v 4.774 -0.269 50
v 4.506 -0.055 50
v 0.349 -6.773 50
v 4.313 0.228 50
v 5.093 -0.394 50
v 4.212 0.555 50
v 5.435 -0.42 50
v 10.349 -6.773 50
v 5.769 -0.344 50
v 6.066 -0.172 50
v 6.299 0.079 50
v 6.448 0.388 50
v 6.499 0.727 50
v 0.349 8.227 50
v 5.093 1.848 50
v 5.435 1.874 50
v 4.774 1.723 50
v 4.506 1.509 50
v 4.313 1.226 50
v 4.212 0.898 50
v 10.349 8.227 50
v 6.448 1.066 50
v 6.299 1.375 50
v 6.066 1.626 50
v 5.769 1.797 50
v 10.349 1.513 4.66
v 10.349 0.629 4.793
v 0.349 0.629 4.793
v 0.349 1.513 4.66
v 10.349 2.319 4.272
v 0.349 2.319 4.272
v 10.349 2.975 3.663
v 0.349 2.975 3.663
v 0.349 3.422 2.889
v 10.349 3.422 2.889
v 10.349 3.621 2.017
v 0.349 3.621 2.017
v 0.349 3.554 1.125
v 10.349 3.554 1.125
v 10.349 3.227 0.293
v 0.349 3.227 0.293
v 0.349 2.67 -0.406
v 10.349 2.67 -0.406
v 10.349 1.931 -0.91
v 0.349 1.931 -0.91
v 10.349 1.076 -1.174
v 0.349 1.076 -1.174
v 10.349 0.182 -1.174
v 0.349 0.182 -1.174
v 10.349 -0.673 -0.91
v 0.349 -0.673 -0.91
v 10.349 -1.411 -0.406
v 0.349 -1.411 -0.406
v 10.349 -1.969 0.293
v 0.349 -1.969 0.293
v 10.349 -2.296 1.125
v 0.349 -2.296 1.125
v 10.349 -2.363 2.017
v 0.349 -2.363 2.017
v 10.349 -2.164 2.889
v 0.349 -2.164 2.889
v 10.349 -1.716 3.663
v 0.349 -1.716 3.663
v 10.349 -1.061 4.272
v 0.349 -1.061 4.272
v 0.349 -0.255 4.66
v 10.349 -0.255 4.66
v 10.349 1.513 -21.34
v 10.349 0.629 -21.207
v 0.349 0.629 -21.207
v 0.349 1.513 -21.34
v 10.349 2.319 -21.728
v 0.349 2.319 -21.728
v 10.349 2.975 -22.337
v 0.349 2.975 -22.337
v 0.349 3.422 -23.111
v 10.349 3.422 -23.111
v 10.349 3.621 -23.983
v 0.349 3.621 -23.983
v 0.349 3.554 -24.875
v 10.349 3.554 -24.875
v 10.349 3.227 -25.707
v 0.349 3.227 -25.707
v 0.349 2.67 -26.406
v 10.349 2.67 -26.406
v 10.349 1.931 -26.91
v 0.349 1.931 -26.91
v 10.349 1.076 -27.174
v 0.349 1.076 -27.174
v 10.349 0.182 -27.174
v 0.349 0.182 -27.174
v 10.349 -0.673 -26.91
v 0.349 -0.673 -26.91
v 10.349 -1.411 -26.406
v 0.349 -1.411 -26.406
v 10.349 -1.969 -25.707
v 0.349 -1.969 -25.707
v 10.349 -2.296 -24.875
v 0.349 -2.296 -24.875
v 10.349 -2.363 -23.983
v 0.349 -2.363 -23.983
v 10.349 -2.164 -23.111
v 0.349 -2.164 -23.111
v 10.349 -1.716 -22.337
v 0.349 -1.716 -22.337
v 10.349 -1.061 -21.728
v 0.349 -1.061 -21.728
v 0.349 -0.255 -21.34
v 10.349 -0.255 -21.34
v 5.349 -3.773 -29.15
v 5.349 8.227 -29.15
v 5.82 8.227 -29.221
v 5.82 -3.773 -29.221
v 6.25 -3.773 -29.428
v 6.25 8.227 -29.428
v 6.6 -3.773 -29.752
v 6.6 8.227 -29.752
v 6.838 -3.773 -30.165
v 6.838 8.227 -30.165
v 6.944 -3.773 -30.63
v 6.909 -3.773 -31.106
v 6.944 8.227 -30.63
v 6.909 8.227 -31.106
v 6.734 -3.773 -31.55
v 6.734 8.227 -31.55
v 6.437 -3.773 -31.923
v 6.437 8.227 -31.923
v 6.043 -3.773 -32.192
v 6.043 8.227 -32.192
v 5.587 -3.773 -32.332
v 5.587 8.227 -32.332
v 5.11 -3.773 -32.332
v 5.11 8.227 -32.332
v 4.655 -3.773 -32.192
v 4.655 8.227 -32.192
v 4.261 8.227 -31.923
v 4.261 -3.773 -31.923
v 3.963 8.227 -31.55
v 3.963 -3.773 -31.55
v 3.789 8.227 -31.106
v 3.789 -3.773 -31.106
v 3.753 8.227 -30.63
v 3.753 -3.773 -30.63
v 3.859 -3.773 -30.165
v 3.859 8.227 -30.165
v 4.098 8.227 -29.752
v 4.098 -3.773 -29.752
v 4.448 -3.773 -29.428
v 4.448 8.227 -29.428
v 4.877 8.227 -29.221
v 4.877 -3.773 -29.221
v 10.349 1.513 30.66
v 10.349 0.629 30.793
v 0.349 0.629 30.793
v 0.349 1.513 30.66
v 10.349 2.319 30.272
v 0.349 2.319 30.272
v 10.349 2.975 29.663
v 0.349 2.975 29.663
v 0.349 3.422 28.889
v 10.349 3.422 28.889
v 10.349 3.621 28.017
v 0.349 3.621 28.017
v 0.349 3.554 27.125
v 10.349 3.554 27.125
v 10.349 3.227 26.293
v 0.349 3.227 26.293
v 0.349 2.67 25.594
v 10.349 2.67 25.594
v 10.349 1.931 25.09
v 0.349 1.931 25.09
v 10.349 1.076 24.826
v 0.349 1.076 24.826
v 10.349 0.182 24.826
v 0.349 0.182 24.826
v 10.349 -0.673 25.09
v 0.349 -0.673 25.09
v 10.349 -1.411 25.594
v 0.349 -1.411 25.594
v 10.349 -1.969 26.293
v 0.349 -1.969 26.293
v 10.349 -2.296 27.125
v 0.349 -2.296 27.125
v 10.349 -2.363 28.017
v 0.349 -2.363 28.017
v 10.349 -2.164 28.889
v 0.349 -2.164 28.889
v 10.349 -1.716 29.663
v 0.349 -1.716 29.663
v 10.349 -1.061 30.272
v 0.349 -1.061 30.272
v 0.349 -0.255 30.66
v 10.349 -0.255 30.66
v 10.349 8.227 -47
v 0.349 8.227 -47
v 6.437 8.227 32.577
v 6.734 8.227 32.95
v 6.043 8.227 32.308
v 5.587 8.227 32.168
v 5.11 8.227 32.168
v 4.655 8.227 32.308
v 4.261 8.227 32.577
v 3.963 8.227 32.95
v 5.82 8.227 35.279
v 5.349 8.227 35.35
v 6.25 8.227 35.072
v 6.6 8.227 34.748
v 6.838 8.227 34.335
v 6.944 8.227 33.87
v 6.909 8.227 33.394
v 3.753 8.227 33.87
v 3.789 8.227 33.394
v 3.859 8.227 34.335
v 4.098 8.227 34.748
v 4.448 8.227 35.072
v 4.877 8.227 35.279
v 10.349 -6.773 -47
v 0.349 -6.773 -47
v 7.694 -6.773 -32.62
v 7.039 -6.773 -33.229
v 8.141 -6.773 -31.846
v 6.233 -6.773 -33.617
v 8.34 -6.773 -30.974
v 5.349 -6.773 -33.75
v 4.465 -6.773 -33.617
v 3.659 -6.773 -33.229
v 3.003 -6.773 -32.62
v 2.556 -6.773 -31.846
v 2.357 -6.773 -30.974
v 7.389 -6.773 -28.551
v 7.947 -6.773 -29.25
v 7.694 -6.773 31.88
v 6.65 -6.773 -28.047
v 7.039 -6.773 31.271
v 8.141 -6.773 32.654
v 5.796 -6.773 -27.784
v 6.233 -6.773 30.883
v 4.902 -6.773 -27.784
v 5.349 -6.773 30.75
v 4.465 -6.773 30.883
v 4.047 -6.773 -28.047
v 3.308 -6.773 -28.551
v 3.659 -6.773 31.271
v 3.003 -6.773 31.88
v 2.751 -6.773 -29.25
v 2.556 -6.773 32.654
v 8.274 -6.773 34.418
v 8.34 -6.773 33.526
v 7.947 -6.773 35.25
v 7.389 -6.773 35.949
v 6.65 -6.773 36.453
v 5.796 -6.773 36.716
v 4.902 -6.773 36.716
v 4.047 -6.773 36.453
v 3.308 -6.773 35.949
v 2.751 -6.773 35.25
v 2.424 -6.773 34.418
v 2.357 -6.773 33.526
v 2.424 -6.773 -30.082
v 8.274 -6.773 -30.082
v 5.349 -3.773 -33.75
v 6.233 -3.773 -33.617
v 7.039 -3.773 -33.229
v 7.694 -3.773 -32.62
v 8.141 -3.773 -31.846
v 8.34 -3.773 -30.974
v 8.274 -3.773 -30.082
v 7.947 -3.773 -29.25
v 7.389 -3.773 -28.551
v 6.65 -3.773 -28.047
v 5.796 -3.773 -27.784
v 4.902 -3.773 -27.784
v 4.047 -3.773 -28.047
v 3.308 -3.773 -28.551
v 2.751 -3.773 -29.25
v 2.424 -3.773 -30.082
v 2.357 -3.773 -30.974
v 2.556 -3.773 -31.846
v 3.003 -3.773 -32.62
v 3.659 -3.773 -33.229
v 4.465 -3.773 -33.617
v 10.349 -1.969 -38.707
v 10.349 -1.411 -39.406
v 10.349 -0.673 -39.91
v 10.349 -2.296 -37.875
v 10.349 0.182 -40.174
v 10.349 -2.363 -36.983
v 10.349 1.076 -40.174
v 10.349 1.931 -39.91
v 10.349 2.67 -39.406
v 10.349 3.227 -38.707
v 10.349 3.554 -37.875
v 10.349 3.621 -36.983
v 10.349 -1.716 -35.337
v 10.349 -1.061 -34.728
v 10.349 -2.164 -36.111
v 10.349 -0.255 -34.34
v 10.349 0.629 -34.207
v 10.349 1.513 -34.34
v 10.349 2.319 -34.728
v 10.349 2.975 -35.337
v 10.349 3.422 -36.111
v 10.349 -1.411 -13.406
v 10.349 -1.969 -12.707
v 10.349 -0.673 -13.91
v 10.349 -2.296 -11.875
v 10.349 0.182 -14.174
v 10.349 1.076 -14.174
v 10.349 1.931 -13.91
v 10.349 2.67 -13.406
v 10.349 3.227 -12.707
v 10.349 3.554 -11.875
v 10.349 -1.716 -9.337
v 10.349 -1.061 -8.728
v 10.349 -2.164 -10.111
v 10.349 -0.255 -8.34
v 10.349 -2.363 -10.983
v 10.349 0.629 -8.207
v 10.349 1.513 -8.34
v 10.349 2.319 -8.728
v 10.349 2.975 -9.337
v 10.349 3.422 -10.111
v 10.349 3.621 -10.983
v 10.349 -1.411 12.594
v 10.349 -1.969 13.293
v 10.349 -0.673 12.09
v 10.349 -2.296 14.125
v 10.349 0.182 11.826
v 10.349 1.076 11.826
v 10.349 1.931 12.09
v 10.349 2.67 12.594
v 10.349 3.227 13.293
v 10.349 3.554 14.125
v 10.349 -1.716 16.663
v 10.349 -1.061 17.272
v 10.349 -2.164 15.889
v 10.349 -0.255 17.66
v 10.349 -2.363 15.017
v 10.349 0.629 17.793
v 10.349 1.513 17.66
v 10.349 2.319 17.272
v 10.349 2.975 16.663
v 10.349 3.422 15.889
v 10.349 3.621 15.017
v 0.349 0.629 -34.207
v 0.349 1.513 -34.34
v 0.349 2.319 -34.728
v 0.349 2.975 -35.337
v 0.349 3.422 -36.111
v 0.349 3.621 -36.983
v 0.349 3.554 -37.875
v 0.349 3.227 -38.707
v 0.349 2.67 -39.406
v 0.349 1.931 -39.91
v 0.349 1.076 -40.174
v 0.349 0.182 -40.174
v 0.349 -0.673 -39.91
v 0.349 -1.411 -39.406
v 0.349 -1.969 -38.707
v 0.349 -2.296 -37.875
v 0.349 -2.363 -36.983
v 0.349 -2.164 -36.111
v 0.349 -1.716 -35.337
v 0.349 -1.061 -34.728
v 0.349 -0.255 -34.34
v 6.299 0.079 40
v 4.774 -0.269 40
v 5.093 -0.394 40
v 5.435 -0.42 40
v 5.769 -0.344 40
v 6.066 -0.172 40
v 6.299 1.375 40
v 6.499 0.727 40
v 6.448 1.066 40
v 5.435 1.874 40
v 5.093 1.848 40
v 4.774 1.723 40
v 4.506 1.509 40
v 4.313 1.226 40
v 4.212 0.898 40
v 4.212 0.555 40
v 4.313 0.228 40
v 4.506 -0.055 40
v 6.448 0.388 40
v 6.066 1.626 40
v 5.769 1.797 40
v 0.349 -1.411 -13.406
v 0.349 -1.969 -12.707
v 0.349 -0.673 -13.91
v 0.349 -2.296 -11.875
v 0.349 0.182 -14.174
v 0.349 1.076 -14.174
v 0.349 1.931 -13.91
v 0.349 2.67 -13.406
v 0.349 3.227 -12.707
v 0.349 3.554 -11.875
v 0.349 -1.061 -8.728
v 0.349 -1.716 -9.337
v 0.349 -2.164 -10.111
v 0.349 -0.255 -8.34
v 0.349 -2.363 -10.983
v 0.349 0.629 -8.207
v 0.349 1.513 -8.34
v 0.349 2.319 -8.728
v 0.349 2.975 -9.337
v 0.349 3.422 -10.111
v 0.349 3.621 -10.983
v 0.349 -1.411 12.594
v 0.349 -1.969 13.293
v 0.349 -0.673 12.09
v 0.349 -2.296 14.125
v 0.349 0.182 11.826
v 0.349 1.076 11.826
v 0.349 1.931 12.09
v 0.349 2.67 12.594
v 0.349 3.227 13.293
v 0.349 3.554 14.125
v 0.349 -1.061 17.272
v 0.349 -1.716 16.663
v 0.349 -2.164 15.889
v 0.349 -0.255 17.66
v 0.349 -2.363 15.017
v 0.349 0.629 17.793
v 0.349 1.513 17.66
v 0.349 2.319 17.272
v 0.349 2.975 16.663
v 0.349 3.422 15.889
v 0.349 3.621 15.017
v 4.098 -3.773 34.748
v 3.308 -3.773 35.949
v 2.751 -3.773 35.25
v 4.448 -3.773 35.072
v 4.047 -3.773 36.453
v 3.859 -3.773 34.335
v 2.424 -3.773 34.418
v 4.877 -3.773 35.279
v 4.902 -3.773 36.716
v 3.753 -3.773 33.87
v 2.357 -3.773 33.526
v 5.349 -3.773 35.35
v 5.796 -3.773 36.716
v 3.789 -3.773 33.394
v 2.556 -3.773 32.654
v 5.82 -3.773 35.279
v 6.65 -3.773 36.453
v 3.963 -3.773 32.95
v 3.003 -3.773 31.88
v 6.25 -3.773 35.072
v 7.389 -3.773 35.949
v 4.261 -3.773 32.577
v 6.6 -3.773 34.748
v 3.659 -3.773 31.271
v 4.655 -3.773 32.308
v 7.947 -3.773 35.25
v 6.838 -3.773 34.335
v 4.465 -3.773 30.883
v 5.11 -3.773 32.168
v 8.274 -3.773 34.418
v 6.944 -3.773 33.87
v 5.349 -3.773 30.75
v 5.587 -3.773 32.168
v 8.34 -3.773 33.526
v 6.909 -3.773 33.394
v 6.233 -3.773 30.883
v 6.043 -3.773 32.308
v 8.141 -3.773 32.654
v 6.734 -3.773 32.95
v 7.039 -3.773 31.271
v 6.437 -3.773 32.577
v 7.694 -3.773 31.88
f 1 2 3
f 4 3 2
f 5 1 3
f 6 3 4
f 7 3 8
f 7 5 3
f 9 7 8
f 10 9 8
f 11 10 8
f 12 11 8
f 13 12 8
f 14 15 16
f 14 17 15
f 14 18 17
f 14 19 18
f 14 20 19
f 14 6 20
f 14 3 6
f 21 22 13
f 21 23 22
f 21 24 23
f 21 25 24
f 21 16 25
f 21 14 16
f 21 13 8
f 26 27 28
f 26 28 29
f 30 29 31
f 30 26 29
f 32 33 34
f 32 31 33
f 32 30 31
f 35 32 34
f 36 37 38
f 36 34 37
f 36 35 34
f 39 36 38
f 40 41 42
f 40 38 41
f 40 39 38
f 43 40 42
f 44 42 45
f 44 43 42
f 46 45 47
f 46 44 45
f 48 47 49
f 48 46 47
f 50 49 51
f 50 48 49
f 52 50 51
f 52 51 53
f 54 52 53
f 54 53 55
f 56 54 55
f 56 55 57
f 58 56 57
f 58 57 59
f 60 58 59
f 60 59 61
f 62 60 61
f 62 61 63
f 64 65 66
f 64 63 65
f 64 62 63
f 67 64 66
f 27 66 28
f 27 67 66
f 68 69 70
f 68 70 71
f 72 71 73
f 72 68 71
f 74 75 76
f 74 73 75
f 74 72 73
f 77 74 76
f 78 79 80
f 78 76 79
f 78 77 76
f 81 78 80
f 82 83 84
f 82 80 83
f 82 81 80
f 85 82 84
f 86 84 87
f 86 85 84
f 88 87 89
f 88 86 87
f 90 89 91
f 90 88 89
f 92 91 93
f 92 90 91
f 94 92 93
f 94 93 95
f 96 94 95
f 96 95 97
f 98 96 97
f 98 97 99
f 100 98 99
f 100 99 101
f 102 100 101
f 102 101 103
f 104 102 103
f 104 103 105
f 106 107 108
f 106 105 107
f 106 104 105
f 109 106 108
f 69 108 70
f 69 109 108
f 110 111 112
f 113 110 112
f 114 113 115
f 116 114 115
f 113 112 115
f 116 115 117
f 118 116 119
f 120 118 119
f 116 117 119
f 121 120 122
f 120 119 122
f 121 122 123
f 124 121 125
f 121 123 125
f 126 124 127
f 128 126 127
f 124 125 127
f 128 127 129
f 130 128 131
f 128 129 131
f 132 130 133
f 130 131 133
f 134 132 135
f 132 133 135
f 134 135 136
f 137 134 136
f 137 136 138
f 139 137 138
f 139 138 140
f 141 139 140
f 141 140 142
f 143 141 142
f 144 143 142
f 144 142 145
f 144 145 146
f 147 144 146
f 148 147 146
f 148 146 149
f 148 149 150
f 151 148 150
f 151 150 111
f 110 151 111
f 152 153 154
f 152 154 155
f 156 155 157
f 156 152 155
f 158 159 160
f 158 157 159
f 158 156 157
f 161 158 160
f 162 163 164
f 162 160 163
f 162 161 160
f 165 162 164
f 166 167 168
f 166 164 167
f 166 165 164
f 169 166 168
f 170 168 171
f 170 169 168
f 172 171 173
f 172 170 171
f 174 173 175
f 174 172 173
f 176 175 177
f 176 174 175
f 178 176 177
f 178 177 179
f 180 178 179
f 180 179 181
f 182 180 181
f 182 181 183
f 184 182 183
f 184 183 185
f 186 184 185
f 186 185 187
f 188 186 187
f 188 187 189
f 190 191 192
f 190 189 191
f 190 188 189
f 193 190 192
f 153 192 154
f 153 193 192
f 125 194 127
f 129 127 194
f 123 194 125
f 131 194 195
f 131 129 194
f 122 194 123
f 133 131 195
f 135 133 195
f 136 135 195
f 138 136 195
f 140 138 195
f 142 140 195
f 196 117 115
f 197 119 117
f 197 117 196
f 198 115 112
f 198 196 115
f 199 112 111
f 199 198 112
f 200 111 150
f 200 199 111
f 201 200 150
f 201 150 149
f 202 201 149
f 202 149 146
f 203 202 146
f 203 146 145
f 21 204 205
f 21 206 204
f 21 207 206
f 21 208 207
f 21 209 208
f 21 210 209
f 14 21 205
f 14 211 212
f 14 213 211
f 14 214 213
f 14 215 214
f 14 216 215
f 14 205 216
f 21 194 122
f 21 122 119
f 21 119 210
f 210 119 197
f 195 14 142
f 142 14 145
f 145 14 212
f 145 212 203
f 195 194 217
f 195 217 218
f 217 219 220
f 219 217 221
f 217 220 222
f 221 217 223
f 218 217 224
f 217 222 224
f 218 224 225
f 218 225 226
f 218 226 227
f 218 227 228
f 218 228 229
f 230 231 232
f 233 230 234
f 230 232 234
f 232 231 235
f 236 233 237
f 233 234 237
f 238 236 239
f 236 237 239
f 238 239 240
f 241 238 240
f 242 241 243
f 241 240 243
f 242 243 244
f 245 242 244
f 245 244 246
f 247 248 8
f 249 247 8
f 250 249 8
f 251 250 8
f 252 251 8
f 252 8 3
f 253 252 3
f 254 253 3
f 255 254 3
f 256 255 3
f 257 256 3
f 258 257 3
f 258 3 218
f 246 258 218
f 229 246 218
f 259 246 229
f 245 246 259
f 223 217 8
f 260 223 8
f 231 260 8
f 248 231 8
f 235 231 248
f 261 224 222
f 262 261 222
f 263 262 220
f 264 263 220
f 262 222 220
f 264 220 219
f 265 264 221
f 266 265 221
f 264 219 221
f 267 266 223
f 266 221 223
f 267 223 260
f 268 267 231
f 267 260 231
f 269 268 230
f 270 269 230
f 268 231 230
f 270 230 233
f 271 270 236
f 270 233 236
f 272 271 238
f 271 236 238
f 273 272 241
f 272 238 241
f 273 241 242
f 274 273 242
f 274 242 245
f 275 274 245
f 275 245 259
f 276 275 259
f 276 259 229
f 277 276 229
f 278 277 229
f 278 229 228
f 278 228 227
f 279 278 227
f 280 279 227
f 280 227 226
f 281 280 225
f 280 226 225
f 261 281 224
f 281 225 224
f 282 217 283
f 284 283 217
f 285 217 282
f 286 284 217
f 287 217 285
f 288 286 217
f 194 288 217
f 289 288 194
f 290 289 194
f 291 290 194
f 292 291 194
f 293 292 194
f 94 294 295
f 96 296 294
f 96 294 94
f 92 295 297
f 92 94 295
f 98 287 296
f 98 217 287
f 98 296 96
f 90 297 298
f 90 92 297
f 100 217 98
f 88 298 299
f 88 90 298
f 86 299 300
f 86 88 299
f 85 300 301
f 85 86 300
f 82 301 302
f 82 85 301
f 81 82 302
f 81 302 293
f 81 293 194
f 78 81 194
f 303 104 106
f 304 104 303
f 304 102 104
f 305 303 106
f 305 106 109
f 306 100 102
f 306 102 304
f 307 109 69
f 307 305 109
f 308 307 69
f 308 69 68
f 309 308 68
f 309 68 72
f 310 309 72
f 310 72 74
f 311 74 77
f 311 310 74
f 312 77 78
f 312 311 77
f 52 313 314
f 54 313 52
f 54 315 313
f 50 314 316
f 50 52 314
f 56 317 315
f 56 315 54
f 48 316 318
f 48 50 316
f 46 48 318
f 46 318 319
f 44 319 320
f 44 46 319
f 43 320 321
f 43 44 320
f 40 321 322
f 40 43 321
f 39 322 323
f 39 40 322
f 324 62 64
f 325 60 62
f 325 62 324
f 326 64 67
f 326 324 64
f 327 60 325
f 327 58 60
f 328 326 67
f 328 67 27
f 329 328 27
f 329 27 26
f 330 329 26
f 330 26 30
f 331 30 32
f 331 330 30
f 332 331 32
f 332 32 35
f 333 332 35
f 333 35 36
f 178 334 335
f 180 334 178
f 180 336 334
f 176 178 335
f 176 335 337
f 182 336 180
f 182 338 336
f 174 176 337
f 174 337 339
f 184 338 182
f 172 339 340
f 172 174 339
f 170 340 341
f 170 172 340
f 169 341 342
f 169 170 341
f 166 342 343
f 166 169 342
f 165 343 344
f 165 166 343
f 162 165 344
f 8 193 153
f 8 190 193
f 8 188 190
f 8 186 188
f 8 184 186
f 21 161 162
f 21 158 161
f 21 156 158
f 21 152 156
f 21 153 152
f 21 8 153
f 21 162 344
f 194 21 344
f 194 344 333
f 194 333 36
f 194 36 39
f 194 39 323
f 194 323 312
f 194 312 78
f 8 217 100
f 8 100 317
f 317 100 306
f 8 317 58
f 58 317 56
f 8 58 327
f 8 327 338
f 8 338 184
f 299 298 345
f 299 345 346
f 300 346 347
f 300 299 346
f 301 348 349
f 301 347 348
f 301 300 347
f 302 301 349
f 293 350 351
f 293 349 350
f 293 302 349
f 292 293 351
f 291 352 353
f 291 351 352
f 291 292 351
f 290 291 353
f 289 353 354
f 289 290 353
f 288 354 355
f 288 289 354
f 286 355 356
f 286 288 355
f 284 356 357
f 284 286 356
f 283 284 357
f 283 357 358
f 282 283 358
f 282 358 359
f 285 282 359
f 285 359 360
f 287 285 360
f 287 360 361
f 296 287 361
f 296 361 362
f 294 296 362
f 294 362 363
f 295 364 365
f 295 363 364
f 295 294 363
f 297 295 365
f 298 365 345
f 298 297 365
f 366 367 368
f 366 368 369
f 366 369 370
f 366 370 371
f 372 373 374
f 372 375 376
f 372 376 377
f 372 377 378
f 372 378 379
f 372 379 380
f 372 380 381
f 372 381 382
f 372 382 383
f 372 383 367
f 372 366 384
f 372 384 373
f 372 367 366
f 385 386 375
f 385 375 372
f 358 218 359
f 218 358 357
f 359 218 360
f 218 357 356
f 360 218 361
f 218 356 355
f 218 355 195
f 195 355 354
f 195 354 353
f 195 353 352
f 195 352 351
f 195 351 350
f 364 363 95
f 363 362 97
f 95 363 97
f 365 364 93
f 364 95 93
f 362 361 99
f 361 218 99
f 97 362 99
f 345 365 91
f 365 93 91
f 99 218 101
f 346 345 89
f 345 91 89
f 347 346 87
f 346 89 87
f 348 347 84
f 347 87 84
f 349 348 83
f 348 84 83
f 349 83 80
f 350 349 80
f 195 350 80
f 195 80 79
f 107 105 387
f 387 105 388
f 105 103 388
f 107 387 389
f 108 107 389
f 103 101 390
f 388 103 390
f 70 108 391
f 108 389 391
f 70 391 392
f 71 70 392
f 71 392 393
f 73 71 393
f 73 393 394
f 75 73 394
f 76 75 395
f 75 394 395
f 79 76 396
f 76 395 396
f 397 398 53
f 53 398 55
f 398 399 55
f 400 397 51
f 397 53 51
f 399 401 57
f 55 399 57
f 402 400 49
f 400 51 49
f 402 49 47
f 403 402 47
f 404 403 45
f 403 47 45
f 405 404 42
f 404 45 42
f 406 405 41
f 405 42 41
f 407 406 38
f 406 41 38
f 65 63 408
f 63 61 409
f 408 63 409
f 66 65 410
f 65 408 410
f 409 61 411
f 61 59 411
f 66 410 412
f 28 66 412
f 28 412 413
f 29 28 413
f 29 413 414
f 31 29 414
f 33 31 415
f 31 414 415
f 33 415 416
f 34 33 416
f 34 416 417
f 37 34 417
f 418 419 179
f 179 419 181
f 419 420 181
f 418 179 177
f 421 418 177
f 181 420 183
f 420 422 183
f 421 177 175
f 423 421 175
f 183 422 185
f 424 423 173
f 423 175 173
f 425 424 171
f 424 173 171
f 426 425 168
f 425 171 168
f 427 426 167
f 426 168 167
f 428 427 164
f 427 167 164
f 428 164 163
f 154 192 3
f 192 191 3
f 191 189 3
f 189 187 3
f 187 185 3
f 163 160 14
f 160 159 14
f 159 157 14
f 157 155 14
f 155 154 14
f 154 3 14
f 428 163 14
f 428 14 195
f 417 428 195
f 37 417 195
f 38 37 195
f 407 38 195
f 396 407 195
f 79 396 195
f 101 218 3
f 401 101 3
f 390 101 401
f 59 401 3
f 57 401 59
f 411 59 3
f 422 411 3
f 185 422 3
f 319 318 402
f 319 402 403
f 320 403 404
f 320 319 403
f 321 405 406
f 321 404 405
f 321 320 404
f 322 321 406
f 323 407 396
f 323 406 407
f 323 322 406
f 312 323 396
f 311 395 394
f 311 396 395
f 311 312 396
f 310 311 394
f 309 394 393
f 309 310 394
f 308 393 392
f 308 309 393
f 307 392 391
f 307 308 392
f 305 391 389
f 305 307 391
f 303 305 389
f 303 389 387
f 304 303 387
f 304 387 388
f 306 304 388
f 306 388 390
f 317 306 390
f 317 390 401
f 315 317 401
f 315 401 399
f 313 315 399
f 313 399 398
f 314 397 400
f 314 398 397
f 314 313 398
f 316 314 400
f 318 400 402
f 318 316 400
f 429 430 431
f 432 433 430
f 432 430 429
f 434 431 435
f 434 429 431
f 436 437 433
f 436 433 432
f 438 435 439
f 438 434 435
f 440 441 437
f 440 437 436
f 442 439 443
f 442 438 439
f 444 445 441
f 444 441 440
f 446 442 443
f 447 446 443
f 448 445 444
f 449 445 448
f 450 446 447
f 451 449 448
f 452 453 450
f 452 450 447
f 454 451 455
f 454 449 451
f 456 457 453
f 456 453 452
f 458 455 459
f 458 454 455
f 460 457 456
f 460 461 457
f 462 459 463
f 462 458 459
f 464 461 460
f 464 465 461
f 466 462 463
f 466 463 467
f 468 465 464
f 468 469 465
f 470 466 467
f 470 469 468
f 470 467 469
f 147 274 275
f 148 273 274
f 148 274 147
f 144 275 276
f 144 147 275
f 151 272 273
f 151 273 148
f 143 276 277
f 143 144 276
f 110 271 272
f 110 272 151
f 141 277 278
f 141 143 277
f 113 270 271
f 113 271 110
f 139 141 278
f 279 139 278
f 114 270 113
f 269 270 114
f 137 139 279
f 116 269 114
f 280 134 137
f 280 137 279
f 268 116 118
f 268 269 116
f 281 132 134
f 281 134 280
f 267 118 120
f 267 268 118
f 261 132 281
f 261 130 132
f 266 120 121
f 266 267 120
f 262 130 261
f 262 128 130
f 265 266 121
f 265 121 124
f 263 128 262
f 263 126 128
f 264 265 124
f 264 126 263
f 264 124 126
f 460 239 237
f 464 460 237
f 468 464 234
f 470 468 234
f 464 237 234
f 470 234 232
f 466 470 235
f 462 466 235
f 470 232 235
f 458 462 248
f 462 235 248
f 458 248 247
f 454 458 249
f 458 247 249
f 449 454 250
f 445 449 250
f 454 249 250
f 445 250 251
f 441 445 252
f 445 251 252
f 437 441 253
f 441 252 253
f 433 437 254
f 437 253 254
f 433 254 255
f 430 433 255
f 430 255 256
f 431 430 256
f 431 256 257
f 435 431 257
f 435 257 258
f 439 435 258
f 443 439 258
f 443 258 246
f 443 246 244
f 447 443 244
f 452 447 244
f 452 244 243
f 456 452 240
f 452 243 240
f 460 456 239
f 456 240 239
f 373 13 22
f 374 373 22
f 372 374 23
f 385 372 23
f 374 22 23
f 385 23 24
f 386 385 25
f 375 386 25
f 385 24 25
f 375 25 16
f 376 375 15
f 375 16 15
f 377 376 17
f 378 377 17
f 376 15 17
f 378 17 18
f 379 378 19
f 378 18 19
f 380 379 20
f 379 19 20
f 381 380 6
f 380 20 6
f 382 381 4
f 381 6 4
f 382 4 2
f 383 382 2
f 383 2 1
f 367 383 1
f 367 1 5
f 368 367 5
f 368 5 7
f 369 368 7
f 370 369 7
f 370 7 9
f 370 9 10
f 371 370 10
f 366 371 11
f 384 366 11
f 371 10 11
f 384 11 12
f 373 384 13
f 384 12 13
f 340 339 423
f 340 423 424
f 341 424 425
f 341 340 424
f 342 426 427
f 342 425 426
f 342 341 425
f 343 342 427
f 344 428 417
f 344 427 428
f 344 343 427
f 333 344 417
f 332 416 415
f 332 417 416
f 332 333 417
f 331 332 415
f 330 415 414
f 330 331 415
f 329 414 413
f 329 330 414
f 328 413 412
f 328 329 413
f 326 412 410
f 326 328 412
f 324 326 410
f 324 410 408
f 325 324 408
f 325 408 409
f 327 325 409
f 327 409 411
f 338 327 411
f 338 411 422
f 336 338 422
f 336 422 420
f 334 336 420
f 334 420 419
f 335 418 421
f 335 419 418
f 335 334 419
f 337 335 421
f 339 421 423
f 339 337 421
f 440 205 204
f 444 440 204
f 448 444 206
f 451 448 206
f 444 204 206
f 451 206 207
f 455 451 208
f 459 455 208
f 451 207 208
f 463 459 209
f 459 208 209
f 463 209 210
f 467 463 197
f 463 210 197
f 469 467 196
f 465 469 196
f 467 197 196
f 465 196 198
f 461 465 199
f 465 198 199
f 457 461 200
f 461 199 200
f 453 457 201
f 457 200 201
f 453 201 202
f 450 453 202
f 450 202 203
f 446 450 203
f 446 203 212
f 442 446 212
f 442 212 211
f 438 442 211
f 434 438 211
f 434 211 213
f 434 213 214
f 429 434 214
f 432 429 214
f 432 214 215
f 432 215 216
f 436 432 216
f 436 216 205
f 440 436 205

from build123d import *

# Parameters (mm, degrees)
SZKIC1_W                        = 10
SZKIC1_H                        = 15
DODANIE_WYCI_GNI_CIE1_DEPTH     = 50
SZKIC2_W                        = 10
SZKIC2_H                        = 15
DODANIE_WYCI_GNI_CIE2_DEPTH     = 47
SZKIC3_R                        = 1.6
WYTNIJ_WYCI_GNI_CIE1_DEPTH      = 54.217463596
SZKIC4_R                        = 3
WYTNIJ_WYCI_GNI_CIE2_DEPTH      = 3
SZKIC5_R                        = 1.15
WYTNIJ_WYCI_GNI_CIE3_DEPTH      = 10
WYTNIJ_WYCI_GNI_CIE4_DEPTH      = 51.91835936
WYTNIJ_WYCI_GNI_CIE4_DEPTH_BACK = 51.91835936
SZKIC7_R                        = 3


with BuildPart() as part:
    # Szkic1 → Dodanie-wyciągnięcie1 (new body)
    with BuildSketch(Plane.XY):
        with Locations((5.348837209, 0.726744186)):
            Rectangle(SZKIC1_W, SZKIC1_H)
    extrude(amount=DODANIE_WYCI_GNI_CIE1_DEPTH)

    # Szkic2 → Dodanie-wyciągnięcie2 (add)
    with BuildSketch(Plane(origin=(0, 0, 0), x_dir=(-1, 0, 0), z_dir=(0, 0, -1))):
        with Locations((-5.348837209, 0.726744186)):
            Rectangle(SZKIC2_W, SZKIC2_H)
    extrude(amount=DODANIE_WYCI_GNI_CIE2_DEPTH)

    # Szkic3 → Wytnij-wyciągnięcie1 (cut, through all)
    with BuildSketch(Plane(origin=(0, 8.226744186, 0), x_dir=(1, 0, 0), z_dir=(0, 1, 0))):
        with Locations(Location((5.348837209, 30.75, 0), (0, 0, 270))):
            Circle(SZKIC3_R)
        with Locations(Location((5.348837209, -33.75, 0), (0, 0, 270))):
            Circle(SZKIC3_R)
    extrude(amount=-WYTNIJ_WYCI_GNI_CIE1_DEPTH, mode=Mode.SUBTRACT)

    # Szkic4 → Wytnij-wyciągnięcie2 (cut)
    with BuildSketch(Plane.XZ.offset(6.773255814)):
        with Locations(Location((5.348837209, -30.75, 0), (0, 0, 270))):
            Circle(SZKIC4_R)
        with Locations(Location((5.348837209, 33.75, 0), (0, 0, 270))):
            Circle(SZKIC4_R)
    extrude(amount=-WYTNIJ_WYCI_GNI_CIE2_DEPTH, mode=Mode.SUBTRACT)

    # Szkic5 → Wytnij-wyciągnięcie3 (cut)
    with BuildSketch(Plane.XY.offset(50)):
        with Locations((5.348837209, 0.726744186)):
            Circle(SZKIC5_R)
    extrude(amount=-WYTNIJ_WYCI_GNI_CIE3_DEPTH, mode=Mode.SUBTRACT)

    # Szkic7 → Wytnij-wyciągnięcie4 (cut, two sides: drawn at the far end of the back side and taken through both)
    with BuildSketch(Plane.ZY.offset(-5.348837209).offset(-WYTNIJ_WYCI_GNI_CIE4_DEPTH_BACK)):
        with Locations((27.792952472, 0.629031613)):
            Circle(SZKIC7_R)
        with Locations((14.792952472, 0.629031613)):
            Circle(SZKIC7_R)
        with Locations((1.792952472, 0.629031613)):
            Circle(SZKIC7_R)
        with Locations((-11.207047528, 0.629031613)):
            Circle(SZKIC7_R)
        with Locations((-24.207047528, 0.629031613)):
            Circle(SZKIC7_R)
        with Locations((-37.207047528, 0.629031613)):
            Circle(SZKIC7_R)
    extrude(amount=WYTNIJ_WYCI_GNI_CIE4_DEPTH + WYTNIJ_WYCI_GNI_CIE4_DEPTH_BACK, mode=Mode.SUBTRACT)


solid = part.part
